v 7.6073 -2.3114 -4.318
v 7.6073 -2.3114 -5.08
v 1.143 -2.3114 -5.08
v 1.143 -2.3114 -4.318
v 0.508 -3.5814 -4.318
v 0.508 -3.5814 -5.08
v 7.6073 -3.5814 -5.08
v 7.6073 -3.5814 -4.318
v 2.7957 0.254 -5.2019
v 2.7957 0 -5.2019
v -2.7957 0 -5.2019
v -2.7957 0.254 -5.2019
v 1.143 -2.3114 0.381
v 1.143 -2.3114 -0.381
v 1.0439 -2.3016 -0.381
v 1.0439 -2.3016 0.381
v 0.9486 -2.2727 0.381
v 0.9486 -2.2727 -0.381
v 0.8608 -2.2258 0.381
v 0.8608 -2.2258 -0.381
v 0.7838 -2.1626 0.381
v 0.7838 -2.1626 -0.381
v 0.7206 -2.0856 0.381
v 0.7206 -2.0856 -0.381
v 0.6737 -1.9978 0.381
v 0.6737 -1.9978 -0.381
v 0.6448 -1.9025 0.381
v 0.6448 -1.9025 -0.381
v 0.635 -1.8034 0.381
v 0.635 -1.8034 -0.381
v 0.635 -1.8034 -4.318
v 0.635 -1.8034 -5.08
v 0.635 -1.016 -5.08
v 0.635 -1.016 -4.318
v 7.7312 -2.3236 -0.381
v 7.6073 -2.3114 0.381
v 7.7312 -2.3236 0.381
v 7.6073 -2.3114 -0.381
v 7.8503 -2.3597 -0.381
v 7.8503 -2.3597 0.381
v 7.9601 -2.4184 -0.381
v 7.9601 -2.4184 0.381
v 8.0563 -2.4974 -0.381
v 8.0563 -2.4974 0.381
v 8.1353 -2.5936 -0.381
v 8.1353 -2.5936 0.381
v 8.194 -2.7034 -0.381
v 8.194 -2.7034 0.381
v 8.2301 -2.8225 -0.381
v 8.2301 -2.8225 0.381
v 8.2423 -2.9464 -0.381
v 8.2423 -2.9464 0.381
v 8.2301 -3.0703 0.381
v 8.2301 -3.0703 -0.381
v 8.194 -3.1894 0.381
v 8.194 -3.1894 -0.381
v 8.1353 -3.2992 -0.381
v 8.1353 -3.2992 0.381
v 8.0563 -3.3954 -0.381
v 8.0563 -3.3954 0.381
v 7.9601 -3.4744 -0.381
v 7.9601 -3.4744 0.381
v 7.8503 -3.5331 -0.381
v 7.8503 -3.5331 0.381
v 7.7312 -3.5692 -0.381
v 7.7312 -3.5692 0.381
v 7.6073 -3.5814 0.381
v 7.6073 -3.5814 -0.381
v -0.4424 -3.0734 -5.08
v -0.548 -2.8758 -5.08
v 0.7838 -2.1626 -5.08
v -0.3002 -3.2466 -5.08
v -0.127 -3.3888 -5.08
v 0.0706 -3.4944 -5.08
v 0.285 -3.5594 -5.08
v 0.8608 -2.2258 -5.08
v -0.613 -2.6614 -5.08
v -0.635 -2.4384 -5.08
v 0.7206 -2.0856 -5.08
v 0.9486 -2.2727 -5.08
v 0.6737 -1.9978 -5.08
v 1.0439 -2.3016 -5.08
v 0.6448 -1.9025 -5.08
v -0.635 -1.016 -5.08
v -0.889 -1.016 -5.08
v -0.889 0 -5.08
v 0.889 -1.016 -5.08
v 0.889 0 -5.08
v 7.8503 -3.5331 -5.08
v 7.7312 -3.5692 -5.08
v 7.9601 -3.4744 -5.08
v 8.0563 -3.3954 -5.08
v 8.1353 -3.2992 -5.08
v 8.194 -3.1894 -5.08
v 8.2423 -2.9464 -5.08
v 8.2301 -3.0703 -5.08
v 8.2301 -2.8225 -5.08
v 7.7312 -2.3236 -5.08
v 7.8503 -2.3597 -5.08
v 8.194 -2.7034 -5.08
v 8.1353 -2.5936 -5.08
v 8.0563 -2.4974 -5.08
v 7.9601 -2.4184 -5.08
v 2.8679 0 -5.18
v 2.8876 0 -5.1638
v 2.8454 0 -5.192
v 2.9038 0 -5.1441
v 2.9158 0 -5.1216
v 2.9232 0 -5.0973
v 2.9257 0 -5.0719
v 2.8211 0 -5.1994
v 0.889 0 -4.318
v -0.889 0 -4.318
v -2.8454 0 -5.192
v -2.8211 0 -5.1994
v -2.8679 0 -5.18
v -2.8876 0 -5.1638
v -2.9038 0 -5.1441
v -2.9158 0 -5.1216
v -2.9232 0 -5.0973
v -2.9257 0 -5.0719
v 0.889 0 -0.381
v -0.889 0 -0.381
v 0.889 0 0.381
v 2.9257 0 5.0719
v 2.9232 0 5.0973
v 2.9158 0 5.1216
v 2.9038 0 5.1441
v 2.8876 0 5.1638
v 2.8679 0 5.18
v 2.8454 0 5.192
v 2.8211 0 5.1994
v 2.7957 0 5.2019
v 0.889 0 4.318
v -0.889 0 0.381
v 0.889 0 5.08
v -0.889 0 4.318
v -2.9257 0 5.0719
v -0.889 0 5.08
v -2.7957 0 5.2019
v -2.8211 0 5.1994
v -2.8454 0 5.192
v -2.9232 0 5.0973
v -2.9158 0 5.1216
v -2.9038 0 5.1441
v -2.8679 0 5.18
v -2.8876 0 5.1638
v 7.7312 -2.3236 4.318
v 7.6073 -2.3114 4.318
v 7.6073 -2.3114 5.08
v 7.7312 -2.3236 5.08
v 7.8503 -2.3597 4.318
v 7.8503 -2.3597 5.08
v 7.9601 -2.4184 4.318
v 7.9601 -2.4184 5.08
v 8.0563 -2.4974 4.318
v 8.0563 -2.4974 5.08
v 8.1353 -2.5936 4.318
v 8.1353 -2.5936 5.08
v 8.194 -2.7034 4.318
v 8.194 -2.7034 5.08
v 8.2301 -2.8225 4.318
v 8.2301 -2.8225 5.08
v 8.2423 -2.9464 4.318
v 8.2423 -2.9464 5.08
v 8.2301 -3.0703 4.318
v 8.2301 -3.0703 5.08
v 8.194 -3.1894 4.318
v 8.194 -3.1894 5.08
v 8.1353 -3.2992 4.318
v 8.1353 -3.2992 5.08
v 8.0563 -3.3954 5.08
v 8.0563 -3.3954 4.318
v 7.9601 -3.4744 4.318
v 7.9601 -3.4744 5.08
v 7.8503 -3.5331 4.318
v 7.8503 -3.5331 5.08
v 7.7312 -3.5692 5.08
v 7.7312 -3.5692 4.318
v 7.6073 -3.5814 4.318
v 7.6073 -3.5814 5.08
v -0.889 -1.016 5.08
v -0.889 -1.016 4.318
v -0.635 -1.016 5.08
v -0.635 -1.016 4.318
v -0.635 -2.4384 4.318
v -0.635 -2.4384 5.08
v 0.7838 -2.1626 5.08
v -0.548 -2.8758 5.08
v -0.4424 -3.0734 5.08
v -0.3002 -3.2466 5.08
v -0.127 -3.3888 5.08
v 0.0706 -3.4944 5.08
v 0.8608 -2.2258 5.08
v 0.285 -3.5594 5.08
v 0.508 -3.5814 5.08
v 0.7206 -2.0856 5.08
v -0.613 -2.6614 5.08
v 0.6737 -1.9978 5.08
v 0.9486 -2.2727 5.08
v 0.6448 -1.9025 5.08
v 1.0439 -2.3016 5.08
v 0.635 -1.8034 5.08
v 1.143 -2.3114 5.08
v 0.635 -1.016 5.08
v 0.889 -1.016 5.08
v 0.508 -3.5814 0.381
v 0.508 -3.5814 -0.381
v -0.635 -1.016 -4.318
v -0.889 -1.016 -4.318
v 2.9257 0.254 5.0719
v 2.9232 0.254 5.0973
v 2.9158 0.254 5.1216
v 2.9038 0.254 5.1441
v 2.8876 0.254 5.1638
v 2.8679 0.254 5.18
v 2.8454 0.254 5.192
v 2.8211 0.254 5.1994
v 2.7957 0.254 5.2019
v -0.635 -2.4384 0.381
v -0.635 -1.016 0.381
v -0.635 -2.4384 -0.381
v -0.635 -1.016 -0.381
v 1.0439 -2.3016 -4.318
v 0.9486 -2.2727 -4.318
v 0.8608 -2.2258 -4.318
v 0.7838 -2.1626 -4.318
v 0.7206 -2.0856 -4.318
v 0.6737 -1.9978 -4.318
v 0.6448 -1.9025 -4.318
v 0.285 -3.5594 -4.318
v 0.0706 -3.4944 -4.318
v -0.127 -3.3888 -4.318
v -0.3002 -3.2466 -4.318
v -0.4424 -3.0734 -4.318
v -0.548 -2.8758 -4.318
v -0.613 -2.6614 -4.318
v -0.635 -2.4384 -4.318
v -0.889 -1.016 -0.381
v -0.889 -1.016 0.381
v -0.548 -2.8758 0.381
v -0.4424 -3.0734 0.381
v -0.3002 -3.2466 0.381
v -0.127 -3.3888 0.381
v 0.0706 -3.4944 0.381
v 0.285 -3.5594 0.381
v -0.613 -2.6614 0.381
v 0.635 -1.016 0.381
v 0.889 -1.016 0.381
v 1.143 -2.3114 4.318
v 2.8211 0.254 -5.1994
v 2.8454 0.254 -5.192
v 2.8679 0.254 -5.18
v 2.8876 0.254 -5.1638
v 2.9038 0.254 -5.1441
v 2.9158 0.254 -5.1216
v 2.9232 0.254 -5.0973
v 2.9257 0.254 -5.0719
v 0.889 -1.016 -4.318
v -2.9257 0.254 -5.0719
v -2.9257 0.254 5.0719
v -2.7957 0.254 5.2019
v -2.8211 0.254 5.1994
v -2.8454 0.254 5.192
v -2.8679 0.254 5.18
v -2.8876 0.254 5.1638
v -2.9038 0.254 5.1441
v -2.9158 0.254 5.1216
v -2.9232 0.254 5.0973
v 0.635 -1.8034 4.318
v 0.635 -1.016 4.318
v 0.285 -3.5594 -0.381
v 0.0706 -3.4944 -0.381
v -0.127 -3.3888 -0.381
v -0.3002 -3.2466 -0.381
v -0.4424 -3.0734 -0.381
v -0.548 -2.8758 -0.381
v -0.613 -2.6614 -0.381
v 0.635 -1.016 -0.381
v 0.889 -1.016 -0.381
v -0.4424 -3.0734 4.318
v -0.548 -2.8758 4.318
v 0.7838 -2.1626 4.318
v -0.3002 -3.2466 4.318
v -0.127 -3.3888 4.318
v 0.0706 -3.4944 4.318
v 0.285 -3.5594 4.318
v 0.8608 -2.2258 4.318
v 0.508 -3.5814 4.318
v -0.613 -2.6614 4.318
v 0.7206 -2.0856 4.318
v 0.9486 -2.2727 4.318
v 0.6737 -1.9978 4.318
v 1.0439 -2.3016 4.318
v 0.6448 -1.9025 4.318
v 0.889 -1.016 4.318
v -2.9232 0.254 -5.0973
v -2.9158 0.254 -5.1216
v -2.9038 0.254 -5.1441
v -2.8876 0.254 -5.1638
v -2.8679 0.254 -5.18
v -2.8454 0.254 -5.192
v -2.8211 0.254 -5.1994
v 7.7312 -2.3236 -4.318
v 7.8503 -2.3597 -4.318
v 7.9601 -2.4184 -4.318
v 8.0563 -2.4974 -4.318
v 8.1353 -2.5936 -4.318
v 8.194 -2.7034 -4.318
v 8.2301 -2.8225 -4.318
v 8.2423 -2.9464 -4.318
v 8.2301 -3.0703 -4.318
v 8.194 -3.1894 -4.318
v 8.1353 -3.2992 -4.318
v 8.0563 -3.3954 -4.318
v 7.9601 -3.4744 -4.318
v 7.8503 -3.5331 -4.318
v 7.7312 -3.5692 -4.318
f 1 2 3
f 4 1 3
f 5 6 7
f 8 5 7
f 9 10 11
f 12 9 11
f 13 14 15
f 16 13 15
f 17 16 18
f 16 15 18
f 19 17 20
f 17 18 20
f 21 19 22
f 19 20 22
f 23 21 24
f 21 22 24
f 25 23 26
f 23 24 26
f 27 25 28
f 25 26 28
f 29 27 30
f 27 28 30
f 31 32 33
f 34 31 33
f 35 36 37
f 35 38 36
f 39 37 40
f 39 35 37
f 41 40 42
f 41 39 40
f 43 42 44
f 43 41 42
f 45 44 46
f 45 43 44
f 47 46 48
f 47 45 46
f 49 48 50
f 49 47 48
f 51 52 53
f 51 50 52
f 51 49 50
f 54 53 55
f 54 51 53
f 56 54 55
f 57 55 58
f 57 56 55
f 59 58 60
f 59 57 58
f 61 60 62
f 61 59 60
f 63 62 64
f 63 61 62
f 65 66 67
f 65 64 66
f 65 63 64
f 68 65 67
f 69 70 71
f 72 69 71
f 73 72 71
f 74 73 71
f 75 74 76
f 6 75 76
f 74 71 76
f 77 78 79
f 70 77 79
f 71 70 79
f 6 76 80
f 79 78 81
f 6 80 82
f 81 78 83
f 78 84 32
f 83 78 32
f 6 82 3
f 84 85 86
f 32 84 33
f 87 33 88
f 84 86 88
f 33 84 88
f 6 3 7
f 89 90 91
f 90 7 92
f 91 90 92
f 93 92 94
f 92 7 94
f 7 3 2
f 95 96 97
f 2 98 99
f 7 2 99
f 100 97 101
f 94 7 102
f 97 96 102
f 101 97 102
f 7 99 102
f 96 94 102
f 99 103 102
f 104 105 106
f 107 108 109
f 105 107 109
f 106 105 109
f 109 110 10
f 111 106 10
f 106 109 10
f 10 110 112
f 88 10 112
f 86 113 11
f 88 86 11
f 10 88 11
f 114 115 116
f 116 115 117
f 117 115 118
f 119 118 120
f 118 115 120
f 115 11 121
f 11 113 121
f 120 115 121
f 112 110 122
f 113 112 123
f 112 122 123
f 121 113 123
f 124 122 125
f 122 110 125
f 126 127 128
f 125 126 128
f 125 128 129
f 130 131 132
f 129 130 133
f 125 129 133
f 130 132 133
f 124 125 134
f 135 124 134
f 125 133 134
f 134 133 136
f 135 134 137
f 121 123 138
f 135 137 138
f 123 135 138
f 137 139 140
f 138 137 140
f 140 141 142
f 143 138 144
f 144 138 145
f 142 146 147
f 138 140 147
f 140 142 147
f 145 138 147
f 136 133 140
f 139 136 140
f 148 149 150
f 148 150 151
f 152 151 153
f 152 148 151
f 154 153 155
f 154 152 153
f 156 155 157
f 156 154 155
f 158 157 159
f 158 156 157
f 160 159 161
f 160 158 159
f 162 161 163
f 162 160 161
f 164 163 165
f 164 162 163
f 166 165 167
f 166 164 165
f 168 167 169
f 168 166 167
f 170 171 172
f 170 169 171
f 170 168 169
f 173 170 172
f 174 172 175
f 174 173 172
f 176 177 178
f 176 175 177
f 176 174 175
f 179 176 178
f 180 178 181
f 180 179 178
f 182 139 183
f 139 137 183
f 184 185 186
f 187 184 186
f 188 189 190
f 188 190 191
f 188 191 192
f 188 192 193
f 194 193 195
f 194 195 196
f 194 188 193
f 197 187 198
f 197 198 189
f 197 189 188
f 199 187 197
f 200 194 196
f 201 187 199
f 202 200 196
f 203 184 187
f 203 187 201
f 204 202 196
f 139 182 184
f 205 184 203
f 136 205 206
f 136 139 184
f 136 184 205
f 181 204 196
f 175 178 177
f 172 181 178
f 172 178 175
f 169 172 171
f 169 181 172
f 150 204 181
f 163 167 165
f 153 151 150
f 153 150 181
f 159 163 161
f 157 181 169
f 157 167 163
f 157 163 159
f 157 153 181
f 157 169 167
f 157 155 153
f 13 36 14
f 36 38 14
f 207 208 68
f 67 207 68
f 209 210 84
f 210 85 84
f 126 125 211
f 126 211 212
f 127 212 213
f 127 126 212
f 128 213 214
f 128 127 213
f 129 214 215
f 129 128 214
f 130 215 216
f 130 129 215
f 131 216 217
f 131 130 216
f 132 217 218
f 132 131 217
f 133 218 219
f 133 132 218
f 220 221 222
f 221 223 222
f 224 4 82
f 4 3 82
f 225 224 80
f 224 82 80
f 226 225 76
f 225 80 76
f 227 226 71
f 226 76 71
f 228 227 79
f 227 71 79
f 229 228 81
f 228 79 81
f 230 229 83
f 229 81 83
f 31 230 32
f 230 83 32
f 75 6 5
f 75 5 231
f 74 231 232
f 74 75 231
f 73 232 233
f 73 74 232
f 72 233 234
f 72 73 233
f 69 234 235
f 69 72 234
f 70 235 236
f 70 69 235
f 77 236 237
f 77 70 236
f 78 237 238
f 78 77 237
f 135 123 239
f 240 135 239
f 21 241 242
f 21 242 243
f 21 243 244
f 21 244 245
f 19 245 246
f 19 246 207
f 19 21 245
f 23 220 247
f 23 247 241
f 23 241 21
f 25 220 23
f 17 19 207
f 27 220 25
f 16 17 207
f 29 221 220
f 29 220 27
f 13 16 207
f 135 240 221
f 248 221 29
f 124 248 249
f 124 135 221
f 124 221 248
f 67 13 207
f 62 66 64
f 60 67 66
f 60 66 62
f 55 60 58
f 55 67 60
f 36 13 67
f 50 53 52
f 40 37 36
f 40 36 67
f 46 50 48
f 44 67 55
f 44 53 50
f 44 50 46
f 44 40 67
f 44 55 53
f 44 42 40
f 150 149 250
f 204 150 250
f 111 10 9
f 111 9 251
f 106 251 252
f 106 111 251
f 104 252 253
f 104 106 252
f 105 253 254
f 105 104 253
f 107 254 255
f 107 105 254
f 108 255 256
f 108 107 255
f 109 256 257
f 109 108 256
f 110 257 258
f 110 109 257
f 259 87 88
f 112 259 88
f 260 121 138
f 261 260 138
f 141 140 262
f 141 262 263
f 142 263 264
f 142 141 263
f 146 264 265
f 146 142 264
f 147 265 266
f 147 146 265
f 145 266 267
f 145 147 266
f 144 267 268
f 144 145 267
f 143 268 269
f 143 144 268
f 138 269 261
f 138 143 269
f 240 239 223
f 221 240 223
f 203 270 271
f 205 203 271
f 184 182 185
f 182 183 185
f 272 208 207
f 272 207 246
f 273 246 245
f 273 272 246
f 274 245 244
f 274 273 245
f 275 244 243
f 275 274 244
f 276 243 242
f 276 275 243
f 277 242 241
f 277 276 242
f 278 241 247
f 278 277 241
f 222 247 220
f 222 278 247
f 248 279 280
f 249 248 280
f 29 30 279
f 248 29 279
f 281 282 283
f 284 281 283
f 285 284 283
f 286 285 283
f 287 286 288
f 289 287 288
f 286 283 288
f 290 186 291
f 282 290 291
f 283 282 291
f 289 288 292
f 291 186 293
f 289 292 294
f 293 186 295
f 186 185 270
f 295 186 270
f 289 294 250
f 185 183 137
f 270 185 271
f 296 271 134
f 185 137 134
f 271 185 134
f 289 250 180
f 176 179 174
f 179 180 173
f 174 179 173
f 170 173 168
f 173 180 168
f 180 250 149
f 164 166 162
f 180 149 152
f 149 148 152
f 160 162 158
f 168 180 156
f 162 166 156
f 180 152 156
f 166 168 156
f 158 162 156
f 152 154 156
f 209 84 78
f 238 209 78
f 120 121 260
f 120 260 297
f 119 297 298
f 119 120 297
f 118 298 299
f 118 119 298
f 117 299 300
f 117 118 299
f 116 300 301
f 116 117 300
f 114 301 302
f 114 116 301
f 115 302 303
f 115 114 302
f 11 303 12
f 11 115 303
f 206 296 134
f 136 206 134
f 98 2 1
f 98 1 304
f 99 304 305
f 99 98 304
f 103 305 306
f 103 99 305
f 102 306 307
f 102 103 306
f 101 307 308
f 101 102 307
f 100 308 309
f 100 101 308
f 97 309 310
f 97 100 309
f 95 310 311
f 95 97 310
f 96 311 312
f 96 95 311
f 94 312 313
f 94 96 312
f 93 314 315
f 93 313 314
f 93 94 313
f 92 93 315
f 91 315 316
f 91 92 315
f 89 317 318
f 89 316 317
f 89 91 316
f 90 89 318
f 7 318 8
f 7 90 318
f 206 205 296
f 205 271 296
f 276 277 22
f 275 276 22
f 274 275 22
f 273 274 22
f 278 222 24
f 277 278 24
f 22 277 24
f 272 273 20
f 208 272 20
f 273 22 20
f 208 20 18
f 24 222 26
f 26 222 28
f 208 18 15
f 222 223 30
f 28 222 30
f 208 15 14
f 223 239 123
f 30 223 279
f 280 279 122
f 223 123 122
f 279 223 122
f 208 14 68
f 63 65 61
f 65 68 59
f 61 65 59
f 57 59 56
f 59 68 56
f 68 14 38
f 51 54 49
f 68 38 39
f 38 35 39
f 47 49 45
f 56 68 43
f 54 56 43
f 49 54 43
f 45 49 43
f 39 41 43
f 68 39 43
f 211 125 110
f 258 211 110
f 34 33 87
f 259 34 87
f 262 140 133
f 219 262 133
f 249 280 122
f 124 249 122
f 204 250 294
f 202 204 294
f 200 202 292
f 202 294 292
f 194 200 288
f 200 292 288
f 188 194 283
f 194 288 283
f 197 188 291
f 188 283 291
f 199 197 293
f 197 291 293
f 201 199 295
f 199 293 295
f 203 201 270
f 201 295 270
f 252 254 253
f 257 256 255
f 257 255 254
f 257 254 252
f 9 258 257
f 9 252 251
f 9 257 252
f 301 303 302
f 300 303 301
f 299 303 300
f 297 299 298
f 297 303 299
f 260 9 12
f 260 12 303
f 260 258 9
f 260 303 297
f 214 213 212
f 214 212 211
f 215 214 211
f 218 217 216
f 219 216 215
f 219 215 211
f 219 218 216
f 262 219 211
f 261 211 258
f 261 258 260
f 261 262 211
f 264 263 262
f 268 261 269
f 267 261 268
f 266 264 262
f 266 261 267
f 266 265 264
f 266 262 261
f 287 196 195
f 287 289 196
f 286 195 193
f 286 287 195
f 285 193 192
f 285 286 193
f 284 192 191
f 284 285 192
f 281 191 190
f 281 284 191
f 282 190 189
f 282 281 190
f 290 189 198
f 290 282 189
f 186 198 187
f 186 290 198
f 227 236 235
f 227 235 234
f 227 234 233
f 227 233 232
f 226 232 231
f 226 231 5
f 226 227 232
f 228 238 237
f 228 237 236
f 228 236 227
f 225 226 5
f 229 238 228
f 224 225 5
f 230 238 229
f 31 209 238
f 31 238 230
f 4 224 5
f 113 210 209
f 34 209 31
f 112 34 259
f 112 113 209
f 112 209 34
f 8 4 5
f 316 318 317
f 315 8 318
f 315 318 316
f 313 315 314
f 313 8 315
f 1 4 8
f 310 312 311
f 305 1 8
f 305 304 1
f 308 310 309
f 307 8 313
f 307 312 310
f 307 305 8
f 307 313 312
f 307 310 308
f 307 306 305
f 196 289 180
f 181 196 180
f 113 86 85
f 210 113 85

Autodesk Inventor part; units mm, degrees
sketch "Sketch_2" plane through (0, 0, 0) normal (0, 1, 0) x (-1, 0, 0)
  line L0 (2.9257, -5.0719) -> (2.9257, 5.0719)
  arc A0 (2.9257, 5.0719) -> (2.7957, 5.2019) centre (2.7957, 5.0719) ccw
  line L1 (2.7957, 5.2019) -> (-2.7957, 5.2019)
  arc A1 (-2.7957, 5.2019) -> (-2.9257, 5.0719) centre (-2.7957, 5.0719) ccw
  line L2 (-2.9257, 5.0719) -> (-2.9257, -5.0719)
  arc A2 (-2.9257, -5.0719) -> (-2.7957, -5.2019) centre (-2.7957, -5.0719) ccw
  line L3 (-2.7957, -5.2019) -> (2.7957, -5.2019)
  arc A3 (2.7957, -5.2019) -> (2.9257, -5.0719) centre (2.7957, -5.0719) ccw
extrude "Extrusion1" add sketch "Sketch_2" along normal blind 0.254
sketch "Sketch_1" plane through (0, 0, -4.699) normal (0, 0, 1) x (1, 0, 0)
  line L0 (-0.889, 0) -> (-0.889, -1.016)
  line L1 (-0.889, -1.016) -> (-0.635, -1.016)
  line L2 (-0.635, -1.016) -> (-0.635, -2.4384)
  arc A0 (-0.635, -2.4384) -> (0.508, -3.5814) centre (0.508, -2.4384) ccw
  line L3 (0.508, -3.5814) -> (7.6073, -3.5814)
  arc A1 (7.6073, -3.5814) -> (7.6073, -2.3114) centre (7.6073, -2.9464) ccw
  line L4 (7.6073, -2.3114) -> (1.143, -2.3114)
  arc A2 (0.635, -1.8034) -> (1.143, -2.3114) centre (1.143, -1.8034) ccw
  line L5 (0.635, -1.8034) -> (0.635, -1.016)
  line L6 (0.635, -1.016) -> (0.889, -1.016)
  line L7 (0.889, -1.016) -> (0.889, 0)
  line L8 (0.889, 0) -> (-0.889, 0)
extrude "Extrusion2" add sketch "Sketch_1" along normal mid plane 0.762
pattern_linear "Rectangular Pattern1" count 3 spacing 4.699 along (0, 0, 1) of "Extrusion2"
ref_plane "to_base_XY" through (0, -0.0254, 0) normal (0, 1, 0) x (1, 0, 0)
ref_plane "to_base_YZ" through (0, -0.0254, 0) normal (1, 0, 0) x (0, 0, -1)
ref_plane "to_base_ZX" through (0, -0.0254, 0) normal (0, 0, -1) x (0, 1, 0)
properties part number "M201230_terminal_angW"
